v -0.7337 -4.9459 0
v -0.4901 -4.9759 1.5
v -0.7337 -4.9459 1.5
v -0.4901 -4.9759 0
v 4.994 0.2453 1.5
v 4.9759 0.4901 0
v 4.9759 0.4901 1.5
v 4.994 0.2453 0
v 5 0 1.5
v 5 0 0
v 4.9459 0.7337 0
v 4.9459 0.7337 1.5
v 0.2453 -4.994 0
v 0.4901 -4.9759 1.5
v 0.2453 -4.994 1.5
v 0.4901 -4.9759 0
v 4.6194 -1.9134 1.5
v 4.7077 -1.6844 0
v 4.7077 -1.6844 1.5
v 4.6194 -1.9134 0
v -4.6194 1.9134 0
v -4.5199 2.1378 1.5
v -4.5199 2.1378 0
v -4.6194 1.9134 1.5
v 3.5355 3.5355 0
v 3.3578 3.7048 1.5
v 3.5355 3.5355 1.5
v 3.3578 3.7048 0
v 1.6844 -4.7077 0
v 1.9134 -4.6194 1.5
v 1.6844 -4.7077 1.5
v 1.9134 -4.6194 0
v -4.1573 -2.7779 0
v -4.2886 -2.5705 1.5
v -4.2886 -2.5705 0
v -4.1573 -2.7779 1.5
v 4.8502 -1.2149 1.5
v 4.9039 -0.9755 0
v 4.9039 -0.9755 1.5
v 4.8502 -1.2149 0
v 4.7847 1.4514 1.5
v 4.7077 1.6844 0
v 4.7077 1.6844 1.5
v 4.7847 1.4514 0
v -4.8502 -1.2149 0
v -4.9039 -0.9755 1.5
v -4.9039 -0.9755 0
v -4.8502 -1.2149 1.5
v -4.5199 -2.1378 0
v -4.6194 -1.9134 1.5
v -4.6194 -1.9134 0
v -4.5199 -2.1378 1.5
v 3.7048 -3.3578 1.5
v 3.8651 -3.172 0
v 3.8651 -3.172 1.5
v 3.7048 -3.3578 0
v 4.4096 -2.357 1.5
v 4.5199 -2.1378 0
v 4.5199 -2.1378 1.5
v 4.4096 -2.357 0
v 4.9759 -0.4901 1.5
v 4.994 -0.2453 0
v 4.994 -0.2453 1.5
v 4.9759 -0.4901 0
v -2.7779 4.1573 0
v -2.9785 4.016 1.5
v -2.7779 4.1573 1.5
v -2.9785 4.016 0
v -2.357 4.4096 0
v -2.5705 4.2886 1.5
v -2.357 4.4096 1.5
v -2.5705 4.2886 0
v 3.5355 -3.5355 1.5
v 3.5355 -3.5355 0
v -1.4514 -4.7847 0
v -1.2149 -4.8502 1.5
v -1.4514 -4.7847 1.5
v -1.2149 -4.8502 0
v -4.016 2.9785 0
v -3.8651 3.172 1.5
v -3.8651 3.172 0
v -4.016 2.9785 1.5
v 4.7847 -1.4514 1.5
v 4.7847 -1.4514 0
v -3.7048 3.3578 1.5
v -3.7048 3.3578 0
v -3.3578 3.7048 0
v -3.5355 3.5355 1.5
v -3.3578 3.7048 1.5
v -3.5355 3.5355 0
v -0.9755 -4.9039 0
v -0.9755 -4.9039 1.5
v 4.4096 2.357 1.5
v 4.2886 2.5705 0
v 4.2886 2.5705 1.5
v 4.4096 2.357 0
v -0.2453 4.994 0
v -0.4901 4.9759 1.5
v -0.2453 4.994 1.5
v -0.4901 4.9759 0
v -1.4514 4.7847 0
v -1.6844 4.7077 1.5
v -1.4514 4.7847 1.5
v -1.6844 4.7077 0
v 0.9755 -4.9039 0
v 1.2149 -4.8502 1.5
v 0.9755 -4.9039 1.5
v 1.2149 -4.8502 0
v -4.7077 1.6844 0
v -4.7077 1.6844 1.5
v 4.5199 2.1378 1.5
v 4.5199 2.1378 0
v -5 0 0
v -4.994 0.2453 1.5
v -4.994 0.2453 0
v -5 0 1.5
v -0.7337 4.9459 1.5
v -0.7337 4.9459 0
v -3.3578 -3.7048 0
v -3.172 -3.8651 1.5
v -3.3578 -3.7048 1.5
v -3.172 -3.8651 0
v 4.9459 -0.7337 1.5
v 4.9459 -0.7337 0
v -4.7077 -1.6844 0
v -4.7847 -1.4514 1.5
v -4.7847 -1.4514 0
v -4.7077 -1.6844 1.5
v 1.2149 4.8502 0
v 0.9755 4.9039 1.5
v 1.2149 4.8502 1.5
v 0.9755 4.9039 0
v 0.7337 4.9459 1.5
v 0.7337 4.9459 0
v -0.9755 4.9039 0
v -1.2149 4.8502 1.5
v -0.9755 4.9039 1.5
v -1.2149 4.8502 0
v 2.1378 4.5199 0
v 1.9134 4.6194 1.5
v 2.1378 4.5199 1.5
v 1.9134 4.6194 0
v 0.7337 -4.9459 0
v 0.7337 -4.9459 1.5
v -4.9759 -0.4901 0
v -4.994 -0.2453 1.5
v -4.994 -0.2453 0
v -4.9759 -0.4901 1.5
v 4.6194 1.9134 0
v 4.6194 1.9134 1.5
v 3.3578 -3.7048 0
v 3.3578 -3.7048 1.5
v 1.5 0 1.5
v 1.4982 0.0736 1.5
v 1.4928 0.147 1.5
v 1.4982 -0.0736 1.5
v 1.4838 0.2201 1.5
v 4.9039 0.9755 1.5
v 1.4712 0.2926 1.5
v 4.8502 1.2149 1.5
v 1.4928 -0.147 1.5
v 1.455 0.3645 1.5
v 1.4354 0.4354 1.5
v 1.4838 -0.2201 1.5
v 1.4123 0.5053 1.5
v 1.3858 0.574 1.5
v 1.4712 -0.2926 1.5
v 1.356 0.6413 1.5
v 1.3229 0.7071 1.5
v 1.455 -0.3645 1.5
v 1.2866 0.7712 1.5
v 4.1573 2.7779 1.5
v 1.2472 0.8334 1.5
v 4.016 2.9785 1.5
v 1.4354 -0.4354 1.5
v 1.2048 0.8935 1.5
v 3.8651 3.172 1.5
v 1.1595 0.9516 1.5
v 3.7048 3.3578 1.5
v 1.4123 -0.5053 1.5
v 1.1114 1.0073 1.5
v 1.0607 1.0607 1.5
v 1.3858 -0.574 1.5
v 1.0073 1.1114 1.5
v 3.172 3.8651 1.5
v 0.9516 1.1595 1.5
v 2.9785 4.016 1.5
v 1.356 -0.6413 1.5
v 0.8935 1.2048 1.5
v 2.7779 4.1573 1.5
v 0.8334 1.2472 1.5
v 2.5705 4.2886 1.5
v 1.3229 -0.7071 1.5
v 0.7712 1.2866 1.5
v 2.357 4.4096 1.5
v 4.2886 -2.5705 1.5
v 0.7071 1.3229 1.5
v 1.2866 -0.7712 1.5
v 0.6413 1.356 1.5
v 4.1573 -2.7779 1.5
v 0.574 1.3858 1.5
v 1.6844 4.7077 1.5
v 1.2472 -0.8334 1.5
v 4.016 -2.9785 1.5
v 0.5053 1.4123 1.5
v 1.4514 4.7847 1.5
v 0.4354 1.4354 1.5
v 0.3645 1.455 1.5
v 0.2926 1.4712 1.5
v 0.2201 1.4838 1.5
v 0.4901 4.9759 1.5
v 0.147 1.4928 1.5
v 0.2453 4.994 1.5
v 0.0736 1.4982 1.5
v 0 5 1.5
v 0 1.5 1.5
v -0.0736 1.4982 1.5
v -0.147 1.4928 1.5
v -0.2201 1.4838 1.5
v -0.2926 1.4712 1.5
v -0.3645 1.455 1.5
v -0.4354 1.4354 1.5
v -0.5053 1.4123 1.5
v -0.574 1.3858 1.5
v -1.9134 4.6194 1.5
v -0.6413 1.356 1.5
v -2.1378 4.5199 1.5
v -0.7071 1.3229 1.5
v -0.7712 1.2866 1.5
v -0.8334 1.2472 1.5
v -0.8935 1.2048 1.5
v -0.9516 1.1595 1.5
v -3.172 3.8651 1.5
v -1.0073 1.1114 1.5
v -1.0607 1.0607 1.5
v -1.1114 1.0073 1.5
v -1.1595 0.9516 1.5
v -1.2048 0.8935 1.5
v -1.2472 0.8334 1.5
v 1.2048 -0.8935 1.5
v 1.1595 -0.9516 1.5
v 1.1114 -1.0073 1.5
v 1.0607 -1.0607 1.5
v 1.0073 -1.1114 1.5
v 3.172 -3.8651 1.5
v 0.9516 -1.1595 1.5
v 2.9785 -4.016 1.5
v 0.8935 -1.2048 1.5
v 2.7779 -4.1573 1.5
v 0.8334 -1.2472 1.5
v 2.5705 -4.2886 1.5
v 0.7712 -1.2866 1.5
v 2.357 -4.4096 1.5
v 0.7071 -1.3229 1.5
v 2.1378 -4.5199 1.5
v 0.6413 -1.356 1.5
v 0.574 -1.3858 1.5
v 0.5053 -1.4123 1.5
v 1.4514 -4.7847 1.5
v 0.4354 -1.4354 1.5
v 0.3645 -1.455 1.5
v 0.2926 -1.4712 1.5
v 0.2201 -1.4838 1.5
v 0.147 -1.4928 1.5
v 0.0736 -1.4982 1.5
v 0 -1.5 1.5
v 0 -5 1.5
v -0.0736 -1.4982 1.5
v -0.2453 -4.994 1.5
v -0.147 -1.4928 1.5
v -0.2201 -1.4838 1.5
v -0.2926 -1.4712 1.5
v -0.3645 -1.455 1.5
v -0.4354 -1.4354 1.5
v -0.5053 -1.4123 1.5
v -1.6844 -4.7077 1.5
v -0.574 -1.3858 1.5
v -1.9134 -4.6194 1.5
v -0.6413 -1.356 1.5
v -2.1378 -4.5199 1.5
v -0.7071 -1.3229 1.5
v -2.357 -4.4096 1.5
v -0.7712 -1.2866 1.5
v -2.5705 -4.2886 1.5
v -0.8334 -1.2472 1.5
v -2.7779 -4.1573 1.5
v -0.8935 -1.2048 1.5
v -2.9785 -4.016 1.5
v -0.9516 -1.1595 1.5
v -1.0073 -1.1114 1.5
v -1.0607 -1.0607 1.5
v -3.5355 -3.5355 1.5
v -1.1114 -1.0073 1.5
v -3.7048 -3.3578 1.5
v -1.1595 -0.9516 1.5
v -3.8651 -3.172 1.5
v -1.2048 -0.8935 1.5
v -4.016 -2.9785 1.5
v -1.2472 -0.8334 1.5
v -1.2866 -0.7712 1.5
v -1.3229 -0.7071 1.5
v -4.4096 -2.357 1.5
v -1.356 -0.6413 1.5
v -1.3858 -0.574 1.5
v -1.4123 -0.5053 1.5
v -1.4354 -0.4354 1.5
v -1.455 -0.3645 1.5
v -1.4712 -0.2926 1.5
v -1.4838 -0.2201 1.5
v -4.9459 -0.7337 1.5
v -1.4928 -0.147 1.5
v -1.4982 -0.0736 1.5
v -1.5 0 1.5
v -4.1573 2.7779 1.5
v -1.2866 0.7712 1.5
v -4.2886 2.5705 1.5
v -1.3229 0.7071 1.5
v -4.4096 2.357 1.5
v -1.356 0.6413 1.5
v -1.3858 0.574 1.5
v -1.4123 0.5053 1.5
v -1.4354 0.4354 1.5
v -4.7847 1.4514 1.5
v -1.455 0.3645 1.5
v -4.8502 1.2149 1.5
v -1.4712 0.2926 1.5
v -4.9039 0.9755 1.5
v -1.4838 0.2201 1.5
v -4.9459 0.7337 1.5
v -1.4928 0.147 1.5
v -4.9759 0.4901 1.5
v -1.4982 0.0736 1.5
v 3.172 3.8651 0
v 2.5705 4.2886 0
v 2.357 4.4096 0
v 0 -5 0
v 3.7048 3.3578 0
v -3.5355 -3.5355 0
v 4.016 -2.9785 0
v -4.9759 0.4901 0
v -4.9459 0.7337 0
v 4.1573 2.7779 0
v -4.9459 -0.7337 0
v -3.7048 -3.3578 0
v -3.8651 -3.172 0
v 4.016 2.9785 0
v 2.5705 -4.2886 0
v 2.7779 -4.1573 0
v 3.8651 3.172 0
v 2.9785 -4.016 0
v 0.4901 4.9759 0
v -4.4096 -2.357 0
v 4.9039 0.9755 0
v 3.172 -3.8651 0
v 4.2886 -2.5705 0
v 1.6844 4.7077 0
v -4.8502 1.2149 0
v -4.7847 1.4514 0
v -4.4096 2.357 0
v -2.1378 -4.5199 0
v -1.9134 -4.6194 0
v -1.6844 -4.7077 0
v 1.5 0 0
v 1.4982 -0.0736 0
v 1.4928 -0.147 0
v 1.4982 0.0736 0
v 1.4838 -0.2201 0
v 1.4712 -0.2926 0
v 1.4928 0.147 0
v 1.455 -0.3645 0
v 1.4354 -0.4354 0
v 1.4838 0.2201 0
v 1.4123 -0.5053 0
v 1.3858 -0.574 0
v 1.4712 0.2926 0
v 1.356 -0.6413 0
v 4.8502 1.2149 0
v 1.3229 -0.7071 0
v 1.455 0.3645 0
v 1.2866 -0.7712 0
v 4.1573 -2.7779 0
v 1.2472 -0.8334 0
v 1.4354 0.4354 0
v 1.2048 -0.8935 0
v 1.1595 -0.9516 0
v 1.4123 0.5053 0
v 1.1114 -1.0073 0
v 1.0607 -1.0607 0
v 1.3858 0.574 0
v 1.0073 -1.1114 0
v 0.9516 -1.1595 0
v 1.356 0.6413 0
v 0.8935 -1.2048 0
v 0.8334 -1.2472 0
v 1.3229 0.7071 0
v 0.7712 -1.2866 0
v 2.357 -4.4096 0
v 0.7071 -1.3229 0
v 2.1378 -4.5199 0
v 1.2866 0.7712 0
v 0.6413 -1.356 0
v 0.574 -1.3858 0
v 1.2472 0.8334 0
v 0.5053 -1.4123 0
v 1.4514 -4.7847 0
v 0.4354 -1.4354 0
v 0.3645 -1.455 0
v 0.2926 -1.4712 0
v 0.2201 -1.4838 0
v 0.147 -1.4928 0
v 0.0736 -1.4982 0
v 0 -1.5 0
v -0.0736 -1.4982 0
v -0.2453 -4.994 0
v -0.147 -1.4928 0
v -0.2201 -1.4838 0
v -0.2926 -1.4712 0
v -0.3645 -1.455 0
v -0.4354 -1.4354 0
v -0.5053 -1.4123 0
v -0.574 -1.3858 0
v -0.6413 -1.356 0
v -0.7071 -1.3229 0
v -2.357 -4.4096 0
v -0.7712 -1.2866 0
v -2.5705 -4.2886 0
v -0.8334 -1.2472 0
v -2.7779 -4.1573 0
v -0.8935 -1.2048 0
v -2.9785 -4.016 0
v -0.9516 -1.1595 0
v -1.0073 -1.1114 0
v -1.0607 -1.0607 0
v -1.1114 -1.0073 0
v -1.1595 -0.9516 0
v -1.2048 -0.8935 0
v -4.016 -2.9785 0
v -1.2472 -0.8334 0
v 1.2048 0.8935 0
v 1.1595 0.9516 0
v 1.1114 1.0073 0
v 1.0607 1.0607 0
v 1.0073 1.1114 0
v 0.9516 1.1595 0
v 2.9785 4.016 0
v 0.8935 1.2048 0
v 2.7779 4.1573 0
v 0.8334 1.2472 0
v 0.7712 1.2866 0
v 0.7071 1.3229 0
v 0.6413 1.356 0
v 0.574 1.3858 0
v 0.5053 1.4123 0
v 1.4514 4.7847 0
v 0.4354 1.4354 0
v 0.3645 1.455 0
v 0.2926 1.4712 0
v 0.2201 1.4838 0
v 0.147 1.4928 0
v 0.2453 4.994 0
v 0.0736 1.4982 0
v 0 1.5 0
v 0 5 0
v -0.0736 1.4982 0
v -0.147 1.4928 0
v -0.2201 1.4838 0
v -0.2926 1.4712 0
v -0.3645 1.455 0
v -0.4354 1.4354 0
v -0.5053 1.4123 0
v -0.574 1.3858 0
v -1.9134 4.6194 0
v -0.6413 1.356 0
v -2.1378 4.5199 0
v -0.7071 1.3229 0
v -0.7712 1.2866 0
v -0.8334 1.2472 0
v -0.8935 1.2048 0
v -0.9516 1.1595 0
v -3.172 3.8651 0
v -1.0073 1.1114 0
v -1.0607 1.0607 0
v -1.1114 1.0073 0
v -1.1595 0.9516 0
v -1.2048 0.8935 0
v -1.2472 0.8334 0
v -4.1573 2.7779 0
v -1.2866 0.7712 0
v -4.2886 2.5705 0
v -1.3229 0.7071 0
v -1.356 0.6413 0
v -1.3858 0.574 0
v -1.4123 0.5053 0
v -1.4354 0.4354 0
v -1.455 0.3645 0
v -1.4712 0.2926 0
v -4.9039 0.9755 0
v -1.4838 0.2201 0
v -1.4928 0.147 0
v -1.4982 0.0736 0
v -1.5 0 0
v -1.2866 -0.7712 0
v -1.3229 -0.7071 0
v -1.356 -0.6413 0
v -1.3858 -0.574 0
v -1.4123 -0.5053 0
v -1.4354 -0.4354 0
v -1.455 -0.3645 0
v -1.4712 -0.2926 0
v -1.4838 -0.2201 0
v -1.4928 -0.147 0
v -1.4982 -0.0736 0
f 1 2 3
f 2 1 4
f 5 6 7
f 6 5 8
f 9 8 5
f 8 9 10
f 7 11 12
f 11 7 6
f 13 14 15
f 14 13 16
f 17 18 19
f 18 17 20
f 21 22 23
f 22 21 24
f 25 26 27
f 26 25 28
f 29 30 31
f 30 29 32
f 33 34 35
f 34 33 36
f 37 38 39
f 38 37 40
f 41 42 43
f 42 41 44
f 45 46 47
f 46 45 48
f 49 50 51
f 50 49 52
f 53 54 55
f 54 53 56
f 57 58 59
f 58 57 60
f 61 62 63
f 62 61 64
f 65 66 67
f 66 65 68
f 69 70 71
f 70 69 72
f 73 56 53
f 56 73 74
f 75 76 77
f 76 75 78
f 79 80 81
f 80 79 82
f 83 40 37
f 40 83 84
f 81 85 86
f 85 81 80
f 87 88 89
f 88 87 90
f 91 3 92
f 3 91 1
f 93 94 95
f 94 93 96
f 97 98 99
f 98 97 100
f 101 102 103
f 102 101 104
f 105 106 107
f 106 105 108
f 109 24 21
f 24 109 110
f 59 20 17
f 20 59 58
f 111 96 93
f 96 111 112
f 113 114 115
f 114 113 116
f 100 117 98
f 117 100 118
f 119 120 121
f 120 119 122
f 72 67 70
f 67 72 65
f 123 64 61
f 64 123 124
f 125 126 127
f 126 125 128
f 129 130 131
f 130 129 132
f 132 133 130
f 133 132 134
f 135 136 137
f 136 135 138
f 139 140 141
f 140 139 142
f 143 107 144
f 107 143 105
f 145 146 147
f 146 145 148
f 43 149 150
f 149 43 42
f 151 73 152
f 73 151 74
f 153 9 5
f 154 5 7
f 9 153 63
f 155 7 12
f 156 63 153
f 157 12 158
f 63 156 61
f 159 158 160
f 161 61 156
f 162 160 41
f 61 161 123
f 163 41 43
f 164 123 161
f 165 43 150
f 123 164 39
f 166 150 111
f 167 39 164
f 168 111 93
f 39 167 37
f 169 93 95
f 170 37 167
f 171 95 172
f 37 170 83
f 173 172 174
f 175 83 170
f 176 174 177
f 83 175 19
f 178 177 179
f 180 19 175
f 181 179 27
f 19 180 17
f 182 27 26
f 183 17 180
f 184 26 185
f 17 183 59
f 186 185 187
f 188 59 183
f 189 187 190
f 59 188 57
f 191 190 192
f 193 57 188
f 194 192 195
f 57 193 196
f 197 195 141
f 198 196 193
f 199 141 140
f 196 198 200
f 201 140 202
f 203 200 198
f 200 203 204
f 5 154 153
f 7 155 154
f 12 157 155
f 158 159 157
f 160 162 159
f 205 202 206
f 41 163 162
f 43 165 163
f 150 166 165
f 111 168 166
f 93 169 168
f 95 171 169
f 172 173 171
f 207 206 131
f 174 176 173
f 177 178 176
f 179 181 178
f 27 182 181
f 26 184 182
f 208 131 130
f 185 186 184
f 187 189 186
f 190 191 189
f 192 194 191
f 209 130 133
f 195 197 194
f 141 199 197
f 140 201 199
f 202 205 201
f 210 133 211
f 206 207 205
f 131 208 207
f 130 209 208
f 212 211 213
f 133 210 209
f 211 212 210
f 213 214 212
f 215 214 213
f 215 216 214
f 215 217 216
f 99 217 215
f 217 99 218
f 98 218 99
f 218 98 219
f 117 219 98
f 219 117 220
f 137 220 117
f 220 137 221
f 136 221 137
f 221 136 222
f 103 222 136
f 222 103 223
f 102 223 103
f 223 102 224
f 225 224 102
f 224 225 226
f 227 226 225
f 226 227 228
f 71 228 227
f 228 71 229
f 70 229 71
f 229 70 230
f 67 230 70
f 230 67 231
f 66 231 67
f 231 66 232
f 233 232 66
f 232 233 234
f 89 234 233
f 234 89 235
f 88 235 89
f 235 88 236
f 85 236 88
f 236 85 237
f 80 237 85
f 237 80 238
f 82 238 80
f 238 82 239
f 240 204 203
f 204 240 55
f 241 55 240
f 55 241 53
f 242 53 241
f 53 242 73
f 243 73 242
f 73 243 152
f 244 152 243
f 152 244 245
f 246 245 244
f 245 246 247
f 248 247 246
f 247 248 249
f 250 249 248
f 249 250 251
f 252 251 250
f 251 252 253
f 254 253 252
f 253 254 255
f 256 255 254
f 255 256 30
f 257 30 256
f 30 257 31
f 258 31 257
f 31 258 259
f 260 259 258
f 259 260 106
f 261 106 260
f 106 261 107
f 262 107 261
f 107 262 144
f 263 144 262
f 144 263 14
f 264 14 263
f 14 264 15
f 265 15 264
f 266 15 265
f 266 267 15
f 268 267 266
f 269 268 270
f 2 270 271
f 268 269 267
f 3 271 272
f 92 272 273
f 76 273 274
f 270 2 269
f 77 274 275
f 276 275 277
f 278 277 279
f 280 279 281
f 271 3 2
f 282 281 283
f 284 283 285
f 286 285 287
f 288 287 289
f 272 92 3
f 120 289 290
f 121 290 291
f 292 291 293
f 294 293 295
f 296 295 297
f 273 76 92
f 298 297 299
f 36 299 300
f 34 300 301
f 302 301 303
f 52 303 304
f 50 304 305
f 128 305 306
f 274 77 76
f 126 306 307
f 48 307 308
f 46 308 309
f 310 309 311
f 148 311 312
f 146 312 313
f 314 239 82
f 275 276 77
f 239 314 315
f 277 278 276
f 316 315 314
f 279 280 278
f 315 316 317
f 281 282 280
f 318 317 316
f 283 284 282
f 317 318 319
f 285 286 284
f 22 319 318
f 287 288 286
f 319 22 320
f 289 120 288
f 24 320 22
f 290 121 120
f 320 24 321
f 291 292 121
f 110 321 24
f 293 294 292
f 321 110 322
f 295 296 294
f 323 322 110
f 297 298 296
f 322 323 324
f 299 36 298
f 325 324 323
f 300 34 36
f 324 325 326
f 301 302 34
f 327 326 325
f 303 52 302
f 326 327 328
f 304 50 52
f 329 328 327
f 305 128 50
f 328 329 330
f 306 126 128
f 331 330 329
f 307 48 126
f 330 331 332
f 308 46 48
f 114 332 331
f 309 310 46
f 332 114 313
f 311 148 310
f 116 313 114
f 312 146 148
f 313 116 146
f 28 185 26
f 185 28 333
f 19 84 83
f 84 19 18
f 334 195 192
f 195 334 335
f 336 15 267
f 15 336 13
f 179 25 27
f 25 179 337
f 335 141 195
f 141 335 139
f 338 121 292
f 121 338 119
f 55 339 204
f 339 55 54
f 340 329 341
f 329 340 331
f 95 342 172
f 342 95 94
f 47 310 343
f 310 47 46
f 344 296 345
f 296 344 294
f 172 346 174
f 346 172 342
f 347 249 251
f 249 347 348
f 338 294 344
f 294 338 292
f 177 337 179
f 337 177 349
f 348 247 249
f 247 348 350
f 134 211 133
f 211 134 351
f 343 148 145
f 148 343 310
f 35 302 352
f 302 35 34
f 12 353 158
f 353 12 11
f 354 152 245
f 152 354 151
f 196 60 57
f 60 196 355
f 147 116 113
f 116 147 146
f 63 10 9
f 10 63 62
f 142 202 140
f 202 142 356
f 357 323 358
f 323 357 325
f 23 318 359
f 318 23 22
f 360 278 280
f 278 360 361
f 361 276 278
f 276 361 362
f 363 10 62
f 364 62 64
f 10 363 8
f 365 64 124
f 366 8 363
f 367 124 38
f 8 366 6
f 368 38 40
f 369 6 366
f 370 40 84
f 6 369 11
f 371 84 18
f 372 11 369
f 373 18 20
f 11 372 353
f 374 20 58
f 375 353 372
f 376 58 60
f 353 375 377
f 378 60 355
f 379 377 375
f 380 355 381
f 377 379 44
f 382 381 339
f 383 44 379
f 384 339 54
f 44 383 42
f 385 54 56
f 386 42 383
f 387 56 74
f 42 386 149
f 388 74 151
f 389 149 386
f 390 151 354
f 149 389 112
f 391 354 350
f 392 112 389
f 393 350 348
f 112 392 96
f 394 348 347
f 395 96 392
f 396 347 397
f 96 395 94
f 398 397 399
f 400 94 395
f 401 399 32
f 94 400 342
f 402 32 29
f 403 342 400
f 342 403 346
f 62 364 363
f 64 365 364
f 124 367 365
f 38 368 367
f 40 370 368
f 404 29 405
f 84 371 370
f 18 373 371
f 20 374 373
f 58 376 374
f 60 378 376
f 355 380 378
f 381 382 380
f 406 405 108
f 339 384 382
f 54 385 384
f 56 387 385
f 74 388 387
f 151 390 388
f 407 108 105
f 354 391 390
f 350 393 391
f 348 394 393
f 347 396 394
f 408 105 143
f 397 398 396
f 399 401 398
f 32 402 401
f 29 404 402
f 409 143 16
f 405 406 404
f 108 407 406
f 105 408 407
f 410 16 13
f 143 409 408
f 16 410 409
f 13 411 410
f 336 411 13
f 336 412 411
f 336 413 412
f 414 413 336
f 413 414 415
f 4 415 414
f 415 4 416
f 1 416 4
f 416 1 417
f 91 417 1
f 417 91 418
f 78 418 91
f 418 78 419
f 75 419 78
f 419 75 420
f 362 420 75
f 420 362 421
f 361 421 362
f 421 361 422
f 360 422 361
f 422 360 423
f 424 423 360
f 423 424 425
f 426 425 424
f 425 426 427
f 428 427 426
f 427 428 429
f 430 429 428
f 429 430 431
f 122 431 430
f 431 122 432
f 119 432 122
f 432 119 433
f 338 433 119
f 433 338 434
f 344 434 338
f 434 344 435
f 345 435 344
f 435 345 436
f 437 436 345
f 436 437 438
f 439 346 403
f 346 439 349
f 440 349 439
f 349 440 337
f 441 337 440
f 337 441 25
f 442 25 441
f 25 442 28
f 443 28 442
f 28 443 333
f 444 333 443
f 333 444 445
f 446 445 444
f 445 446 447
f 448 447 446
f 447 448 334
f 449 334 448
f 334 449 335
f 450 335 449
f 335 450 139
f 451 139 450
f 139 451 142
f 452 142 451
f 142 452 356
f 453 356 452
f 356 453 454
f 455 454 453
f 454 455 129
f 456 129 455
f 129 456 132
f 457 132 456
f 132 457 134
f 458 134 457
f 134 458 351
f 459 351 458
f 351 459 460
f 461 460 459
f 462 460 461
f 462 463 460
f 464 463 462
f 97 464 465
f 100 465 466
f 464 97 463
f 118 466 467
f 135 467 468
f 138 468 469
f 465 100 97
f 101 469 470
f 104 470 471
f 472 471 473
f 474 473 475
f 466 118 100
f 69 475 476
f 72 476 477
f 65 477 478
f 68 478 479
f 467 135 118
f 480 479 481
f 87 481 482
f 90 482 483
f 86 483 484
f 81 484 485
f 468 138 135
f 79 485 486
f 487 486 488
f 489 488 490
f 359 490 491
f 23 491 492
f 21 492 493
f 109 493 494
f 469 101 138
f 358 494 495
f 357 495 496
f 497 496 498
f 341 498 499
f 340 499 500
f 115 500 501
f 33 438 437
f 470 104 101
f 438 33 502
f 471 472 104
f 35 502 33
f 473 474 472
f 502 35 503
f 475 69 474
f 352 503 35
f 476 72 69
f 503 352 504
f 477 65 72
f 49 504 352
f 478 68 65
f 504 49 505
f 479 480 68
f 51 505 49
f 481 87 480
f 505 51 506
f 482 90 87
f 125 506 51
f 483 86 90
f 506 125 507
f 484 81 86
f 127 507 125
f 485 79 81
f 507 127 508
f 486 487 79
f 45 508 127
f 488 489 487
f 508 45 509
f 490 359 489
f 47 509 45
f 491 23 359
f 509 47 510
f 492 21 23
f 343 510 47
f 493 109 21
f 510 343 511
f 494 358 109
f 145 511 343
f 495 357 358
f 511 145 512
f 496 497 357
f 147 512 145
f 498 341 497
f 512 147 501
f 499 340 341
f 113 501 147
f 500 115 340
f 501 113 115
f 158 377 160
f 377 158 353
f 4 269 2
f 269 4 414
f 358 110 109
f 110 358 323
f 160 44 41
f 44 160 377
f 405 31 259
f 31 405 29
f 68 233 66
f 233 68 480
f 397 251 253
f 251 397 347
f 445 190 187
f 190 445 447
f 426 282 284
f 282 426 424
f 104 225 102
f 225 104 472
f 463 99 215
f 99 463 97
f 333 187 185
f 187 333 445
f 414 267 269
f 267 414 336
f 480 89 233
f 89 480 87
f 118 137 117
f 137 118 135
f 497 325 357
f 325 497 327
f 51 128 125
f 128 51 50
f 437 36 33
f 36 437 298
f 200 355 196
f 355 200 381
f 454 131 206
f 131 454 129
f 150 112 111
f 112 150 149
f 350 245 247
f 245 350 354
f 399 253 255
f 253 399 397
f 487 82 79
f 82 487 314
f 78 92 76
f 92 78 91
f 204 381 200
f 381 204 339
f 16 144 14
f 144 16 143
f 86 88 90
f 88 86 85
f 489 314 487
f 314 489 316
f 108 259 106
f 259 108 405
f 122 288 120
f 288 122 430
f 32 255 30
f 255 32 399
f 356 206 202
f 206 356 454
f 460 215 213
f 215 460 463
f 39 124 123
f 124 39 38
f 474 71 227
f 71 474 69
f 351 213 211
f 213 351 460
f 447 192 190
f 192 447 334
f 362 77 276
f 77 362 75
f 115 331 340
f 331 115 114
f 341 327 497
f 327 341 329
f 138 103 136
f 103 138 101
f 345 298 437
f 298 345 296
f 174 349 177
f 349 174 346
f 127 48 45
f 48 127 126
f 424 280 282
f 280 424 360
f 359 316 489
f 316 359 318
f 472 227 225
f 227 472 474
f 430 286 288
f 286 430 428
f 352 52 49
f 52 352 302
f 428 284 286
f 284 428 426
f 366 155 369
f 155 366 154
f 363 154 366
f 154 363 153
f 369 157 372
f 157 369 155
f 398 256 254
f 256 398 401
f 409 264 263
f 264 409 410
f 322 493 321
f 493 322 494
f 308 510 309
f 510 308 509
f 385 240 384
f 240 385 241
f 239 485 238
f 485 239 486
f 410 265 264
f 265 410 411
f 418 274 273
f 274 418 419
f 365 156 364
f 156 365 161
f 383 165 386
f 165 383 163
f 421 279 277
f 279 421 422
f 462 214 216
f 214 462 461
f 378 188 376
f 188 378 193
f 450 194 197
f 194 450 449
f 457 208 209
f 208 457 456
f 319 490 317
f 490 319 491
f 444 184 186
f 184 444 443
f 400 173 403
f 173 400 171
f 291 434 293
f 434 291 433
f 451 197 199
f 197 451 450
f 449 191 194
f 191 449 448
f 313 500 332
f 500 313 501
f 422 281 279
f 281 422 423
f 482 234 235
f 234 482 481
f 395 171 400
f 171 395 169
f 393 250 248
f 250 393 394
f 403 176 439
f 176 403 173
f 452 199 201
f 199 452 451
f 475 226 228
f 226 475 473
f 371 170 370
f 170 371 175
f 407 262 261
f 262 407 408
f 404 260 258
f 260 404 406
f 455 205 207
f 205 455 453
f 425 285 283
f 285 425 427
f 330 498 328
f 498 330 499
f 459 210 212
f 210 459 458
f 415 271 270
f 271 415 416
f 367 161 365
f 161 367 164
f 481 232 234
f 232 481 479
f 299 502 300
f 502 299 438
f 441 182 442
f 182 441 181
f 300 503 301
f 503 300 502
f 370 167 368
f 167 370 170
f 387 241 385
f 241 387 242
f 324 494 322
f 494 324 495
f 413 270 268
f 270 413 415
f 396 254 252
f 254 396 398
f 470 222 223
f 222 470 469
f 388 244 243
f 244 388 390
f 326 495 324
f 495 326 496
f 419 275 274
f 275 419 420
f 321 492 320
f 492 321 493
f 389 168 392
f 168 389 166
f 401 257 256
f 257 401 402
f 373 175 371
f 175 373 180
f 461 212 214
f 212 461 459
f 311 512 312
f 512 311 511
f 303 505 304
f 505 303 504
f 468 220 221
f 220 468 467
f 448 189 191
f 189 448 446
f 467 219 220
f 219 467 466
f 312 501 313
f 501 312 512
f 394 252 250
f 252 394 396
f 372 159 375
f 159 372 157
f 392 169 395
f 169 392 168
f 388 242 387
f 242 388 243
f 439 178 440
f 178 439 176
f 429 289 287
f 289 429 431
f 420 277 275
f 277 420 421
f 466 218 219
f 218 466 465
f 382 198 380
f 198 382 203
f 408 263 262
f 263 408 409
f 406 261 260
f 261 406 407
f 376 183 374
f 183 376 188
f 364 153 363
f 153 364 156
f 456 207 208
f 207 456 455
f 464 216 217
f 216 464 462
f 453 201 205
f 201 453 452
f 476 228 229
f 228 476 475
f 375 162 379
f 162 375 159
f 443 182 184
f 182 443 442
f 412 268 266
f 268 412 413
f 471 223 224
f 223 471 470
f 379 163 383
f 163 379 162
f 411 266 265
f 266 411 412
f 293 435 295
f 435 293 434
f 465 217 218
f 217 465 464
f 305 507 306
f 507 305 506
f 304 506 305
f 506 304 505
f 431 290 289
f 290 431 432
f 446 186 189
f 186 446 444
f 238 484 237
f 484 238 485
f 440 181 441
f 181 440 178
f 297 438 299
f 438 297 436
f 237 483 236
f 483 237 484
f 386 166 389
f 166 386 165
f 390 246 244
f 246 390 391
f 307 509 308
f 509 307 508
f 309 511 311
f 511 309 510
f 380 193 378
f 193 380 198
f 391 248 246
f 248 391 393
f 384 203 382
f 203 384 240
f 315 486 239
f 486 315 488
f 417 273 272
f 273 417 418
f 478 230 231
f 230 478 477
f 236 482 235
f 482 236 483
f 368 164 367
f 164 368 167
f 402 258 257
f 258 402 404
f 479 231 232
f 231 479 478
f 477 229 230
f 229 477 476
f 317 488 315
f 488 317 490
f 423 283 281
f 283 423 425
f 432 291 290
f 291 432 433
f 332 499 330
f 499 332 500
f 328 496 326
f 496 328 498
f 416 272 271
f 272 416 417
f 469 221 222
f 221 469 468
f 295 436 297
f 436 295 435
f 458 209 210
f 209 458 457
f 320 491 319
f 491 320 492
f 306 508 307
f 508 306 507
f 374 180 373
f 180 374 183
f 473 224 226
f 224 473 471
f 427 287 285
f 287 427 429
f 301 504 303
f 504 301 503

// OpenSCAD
$fn = 128;

inner_d = 3.0;
outer_d = 10.0;
thickness = 1.5;

difference() {
  cylinder(h = thickness, d = outer_d);
  cylinder(h = thickness + 0.2, d = inner_d);
}
